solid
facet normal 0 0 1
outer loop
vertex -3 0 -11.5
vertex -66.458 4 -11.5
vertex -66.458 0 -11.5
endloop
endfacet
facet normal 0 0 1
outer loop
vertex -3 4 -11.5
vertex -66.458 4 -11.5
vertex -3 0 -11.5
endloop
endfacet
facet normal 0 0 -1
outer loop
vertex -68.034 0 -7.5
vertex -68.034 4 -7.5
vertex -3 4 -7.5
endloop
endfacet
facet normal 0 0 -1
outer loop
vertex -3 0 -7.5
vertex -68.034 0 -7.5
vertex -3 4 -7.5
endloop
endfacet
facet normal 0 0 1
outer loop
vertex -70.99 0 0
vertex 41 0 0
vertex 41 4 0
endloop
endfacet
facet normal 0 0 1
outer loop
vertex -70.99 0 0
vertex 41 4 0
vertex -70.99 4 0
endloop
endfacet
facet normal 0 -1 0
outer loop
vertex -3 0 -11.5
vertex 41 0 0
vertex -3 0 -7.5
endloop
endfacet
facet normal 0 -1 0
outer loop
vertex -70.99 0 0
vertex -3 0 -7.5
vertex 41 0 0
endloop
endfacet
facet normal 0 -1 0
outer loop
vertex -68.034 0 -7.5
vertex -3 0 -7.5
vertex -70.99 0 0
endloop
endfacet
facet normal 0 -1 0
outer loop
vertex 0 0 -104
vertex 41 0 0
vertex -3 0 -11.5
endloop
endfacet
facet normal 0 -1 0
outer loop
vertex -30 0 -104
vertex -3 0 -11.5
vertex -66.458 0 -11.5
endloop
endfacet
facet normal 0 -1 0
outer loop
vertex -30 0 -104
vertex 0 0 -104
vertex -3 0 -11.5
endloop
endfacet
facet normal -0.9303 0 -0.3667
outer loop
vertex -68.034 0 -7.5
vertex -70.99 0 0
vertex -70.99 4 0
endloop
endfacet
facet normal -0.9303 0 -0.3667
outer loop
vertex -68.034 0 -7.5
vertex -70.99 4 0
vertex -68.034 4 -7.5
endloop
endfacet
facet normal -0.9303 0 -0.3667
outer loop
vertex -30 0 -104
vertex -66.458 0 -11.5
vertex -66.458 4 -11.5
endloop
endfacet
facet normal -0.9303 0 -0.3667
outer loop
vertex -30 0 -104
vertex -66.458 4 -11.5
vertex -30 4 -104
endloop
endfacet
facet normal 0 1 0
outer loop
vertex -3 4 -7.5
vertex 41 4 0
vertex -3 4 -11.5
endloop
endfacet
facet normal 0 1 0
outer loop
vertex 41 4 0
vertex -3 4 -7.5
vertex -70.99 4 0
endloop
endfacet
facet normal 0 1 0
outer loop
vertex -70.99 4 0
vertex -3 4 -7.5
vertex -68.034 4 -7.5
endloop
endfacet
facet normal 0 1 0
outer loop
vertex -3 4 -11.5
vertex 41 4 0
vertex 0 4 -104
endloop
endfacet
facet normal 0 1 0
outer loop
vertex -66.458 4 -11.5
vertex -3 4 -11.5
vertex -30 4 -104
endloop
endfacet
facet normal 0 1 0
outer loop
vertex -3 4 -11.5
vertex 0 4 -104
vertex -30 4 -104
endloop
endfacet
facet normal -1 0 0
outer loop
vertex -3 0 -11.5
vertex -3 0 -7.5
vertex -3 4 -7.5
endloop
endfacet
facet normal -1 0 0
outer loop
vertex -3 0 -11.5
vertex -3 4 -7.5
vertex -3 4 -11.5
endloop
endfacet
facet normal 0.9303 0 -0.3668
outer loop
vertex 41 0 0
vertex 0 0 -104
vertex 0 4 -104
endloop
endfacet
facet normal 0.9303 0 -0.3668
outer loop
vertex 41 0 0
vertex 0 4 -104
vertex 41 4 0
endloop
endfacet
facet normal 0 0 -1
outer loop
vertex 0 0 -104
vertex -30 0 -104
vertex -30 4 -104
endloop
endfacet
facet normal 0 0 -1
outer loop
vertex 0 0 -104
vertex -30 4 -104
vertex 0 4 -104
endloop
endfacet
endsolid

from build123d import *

# Parameters (mm, degrees)
SM_BASE_FLANGE_1_DEPTH   = 4
OTHER_START              = -11.5
OTHER_2_DEPTH            = 4
CUT_EXTRUDE_1_DEPTH      = 126.982552614
CUT_EXTRUDE_1_DEPTH_BACK = 126.982552614
SKETCH_7_W               = 3.023259835
SKETCH_7_H               = 4


# Read off the part's stored shape, not the designer's step: Полость2
# Sheet-metal steps are written as plain solids
with BuildPart() as part:
    # Sketch 2 → Базовая кромка1 (new body)
    with BuildSketch(Plane(origin=(0, 0, 0), x_dir=(1, 0, 0), z_dir=(0, 1, 0))):
        Polygon((41, 0), (-70.990165257, 0), (-30, 104), (0, 104), align=None)
    extrude(amount=SM_BASE_FLANGE_1_DEPTH)

    # Полость2 outline → Полость2 (cut)
    with BuildSketch(Plane.XY.offset(OTHER_START)):
        Polygon((-70, 0), (-3, 0), (-6.023259835, 4), (-70, 4), align=None)
    extrude(amount=OTHER_2_DEPTH, mode=Mode.SUBTRACT)

    # Эскиз7 → Вырез-Вытянуть1 (cut, two sides: drawn at the far end of the back side and taken through both)
    with BuildSketch(Plane(origin=(0, 4, 0), x_dir=(1, 0, 0), z_dir=(0, 1, 0)).offset(-CUT_EXTRUDE_1_DEPTH_BACK)):
        with Locations((-4.511629918, 9.5)):
            Rectangle(SKETCH_7_W, SKETCH_7_H)
    extrude(amount=CUT_EXTRUDE_1_DEPTH + CUT_EXTRUDE_1_DEPTH_BACK, mode=Mode.SUBTRACT)


solid = part.part
